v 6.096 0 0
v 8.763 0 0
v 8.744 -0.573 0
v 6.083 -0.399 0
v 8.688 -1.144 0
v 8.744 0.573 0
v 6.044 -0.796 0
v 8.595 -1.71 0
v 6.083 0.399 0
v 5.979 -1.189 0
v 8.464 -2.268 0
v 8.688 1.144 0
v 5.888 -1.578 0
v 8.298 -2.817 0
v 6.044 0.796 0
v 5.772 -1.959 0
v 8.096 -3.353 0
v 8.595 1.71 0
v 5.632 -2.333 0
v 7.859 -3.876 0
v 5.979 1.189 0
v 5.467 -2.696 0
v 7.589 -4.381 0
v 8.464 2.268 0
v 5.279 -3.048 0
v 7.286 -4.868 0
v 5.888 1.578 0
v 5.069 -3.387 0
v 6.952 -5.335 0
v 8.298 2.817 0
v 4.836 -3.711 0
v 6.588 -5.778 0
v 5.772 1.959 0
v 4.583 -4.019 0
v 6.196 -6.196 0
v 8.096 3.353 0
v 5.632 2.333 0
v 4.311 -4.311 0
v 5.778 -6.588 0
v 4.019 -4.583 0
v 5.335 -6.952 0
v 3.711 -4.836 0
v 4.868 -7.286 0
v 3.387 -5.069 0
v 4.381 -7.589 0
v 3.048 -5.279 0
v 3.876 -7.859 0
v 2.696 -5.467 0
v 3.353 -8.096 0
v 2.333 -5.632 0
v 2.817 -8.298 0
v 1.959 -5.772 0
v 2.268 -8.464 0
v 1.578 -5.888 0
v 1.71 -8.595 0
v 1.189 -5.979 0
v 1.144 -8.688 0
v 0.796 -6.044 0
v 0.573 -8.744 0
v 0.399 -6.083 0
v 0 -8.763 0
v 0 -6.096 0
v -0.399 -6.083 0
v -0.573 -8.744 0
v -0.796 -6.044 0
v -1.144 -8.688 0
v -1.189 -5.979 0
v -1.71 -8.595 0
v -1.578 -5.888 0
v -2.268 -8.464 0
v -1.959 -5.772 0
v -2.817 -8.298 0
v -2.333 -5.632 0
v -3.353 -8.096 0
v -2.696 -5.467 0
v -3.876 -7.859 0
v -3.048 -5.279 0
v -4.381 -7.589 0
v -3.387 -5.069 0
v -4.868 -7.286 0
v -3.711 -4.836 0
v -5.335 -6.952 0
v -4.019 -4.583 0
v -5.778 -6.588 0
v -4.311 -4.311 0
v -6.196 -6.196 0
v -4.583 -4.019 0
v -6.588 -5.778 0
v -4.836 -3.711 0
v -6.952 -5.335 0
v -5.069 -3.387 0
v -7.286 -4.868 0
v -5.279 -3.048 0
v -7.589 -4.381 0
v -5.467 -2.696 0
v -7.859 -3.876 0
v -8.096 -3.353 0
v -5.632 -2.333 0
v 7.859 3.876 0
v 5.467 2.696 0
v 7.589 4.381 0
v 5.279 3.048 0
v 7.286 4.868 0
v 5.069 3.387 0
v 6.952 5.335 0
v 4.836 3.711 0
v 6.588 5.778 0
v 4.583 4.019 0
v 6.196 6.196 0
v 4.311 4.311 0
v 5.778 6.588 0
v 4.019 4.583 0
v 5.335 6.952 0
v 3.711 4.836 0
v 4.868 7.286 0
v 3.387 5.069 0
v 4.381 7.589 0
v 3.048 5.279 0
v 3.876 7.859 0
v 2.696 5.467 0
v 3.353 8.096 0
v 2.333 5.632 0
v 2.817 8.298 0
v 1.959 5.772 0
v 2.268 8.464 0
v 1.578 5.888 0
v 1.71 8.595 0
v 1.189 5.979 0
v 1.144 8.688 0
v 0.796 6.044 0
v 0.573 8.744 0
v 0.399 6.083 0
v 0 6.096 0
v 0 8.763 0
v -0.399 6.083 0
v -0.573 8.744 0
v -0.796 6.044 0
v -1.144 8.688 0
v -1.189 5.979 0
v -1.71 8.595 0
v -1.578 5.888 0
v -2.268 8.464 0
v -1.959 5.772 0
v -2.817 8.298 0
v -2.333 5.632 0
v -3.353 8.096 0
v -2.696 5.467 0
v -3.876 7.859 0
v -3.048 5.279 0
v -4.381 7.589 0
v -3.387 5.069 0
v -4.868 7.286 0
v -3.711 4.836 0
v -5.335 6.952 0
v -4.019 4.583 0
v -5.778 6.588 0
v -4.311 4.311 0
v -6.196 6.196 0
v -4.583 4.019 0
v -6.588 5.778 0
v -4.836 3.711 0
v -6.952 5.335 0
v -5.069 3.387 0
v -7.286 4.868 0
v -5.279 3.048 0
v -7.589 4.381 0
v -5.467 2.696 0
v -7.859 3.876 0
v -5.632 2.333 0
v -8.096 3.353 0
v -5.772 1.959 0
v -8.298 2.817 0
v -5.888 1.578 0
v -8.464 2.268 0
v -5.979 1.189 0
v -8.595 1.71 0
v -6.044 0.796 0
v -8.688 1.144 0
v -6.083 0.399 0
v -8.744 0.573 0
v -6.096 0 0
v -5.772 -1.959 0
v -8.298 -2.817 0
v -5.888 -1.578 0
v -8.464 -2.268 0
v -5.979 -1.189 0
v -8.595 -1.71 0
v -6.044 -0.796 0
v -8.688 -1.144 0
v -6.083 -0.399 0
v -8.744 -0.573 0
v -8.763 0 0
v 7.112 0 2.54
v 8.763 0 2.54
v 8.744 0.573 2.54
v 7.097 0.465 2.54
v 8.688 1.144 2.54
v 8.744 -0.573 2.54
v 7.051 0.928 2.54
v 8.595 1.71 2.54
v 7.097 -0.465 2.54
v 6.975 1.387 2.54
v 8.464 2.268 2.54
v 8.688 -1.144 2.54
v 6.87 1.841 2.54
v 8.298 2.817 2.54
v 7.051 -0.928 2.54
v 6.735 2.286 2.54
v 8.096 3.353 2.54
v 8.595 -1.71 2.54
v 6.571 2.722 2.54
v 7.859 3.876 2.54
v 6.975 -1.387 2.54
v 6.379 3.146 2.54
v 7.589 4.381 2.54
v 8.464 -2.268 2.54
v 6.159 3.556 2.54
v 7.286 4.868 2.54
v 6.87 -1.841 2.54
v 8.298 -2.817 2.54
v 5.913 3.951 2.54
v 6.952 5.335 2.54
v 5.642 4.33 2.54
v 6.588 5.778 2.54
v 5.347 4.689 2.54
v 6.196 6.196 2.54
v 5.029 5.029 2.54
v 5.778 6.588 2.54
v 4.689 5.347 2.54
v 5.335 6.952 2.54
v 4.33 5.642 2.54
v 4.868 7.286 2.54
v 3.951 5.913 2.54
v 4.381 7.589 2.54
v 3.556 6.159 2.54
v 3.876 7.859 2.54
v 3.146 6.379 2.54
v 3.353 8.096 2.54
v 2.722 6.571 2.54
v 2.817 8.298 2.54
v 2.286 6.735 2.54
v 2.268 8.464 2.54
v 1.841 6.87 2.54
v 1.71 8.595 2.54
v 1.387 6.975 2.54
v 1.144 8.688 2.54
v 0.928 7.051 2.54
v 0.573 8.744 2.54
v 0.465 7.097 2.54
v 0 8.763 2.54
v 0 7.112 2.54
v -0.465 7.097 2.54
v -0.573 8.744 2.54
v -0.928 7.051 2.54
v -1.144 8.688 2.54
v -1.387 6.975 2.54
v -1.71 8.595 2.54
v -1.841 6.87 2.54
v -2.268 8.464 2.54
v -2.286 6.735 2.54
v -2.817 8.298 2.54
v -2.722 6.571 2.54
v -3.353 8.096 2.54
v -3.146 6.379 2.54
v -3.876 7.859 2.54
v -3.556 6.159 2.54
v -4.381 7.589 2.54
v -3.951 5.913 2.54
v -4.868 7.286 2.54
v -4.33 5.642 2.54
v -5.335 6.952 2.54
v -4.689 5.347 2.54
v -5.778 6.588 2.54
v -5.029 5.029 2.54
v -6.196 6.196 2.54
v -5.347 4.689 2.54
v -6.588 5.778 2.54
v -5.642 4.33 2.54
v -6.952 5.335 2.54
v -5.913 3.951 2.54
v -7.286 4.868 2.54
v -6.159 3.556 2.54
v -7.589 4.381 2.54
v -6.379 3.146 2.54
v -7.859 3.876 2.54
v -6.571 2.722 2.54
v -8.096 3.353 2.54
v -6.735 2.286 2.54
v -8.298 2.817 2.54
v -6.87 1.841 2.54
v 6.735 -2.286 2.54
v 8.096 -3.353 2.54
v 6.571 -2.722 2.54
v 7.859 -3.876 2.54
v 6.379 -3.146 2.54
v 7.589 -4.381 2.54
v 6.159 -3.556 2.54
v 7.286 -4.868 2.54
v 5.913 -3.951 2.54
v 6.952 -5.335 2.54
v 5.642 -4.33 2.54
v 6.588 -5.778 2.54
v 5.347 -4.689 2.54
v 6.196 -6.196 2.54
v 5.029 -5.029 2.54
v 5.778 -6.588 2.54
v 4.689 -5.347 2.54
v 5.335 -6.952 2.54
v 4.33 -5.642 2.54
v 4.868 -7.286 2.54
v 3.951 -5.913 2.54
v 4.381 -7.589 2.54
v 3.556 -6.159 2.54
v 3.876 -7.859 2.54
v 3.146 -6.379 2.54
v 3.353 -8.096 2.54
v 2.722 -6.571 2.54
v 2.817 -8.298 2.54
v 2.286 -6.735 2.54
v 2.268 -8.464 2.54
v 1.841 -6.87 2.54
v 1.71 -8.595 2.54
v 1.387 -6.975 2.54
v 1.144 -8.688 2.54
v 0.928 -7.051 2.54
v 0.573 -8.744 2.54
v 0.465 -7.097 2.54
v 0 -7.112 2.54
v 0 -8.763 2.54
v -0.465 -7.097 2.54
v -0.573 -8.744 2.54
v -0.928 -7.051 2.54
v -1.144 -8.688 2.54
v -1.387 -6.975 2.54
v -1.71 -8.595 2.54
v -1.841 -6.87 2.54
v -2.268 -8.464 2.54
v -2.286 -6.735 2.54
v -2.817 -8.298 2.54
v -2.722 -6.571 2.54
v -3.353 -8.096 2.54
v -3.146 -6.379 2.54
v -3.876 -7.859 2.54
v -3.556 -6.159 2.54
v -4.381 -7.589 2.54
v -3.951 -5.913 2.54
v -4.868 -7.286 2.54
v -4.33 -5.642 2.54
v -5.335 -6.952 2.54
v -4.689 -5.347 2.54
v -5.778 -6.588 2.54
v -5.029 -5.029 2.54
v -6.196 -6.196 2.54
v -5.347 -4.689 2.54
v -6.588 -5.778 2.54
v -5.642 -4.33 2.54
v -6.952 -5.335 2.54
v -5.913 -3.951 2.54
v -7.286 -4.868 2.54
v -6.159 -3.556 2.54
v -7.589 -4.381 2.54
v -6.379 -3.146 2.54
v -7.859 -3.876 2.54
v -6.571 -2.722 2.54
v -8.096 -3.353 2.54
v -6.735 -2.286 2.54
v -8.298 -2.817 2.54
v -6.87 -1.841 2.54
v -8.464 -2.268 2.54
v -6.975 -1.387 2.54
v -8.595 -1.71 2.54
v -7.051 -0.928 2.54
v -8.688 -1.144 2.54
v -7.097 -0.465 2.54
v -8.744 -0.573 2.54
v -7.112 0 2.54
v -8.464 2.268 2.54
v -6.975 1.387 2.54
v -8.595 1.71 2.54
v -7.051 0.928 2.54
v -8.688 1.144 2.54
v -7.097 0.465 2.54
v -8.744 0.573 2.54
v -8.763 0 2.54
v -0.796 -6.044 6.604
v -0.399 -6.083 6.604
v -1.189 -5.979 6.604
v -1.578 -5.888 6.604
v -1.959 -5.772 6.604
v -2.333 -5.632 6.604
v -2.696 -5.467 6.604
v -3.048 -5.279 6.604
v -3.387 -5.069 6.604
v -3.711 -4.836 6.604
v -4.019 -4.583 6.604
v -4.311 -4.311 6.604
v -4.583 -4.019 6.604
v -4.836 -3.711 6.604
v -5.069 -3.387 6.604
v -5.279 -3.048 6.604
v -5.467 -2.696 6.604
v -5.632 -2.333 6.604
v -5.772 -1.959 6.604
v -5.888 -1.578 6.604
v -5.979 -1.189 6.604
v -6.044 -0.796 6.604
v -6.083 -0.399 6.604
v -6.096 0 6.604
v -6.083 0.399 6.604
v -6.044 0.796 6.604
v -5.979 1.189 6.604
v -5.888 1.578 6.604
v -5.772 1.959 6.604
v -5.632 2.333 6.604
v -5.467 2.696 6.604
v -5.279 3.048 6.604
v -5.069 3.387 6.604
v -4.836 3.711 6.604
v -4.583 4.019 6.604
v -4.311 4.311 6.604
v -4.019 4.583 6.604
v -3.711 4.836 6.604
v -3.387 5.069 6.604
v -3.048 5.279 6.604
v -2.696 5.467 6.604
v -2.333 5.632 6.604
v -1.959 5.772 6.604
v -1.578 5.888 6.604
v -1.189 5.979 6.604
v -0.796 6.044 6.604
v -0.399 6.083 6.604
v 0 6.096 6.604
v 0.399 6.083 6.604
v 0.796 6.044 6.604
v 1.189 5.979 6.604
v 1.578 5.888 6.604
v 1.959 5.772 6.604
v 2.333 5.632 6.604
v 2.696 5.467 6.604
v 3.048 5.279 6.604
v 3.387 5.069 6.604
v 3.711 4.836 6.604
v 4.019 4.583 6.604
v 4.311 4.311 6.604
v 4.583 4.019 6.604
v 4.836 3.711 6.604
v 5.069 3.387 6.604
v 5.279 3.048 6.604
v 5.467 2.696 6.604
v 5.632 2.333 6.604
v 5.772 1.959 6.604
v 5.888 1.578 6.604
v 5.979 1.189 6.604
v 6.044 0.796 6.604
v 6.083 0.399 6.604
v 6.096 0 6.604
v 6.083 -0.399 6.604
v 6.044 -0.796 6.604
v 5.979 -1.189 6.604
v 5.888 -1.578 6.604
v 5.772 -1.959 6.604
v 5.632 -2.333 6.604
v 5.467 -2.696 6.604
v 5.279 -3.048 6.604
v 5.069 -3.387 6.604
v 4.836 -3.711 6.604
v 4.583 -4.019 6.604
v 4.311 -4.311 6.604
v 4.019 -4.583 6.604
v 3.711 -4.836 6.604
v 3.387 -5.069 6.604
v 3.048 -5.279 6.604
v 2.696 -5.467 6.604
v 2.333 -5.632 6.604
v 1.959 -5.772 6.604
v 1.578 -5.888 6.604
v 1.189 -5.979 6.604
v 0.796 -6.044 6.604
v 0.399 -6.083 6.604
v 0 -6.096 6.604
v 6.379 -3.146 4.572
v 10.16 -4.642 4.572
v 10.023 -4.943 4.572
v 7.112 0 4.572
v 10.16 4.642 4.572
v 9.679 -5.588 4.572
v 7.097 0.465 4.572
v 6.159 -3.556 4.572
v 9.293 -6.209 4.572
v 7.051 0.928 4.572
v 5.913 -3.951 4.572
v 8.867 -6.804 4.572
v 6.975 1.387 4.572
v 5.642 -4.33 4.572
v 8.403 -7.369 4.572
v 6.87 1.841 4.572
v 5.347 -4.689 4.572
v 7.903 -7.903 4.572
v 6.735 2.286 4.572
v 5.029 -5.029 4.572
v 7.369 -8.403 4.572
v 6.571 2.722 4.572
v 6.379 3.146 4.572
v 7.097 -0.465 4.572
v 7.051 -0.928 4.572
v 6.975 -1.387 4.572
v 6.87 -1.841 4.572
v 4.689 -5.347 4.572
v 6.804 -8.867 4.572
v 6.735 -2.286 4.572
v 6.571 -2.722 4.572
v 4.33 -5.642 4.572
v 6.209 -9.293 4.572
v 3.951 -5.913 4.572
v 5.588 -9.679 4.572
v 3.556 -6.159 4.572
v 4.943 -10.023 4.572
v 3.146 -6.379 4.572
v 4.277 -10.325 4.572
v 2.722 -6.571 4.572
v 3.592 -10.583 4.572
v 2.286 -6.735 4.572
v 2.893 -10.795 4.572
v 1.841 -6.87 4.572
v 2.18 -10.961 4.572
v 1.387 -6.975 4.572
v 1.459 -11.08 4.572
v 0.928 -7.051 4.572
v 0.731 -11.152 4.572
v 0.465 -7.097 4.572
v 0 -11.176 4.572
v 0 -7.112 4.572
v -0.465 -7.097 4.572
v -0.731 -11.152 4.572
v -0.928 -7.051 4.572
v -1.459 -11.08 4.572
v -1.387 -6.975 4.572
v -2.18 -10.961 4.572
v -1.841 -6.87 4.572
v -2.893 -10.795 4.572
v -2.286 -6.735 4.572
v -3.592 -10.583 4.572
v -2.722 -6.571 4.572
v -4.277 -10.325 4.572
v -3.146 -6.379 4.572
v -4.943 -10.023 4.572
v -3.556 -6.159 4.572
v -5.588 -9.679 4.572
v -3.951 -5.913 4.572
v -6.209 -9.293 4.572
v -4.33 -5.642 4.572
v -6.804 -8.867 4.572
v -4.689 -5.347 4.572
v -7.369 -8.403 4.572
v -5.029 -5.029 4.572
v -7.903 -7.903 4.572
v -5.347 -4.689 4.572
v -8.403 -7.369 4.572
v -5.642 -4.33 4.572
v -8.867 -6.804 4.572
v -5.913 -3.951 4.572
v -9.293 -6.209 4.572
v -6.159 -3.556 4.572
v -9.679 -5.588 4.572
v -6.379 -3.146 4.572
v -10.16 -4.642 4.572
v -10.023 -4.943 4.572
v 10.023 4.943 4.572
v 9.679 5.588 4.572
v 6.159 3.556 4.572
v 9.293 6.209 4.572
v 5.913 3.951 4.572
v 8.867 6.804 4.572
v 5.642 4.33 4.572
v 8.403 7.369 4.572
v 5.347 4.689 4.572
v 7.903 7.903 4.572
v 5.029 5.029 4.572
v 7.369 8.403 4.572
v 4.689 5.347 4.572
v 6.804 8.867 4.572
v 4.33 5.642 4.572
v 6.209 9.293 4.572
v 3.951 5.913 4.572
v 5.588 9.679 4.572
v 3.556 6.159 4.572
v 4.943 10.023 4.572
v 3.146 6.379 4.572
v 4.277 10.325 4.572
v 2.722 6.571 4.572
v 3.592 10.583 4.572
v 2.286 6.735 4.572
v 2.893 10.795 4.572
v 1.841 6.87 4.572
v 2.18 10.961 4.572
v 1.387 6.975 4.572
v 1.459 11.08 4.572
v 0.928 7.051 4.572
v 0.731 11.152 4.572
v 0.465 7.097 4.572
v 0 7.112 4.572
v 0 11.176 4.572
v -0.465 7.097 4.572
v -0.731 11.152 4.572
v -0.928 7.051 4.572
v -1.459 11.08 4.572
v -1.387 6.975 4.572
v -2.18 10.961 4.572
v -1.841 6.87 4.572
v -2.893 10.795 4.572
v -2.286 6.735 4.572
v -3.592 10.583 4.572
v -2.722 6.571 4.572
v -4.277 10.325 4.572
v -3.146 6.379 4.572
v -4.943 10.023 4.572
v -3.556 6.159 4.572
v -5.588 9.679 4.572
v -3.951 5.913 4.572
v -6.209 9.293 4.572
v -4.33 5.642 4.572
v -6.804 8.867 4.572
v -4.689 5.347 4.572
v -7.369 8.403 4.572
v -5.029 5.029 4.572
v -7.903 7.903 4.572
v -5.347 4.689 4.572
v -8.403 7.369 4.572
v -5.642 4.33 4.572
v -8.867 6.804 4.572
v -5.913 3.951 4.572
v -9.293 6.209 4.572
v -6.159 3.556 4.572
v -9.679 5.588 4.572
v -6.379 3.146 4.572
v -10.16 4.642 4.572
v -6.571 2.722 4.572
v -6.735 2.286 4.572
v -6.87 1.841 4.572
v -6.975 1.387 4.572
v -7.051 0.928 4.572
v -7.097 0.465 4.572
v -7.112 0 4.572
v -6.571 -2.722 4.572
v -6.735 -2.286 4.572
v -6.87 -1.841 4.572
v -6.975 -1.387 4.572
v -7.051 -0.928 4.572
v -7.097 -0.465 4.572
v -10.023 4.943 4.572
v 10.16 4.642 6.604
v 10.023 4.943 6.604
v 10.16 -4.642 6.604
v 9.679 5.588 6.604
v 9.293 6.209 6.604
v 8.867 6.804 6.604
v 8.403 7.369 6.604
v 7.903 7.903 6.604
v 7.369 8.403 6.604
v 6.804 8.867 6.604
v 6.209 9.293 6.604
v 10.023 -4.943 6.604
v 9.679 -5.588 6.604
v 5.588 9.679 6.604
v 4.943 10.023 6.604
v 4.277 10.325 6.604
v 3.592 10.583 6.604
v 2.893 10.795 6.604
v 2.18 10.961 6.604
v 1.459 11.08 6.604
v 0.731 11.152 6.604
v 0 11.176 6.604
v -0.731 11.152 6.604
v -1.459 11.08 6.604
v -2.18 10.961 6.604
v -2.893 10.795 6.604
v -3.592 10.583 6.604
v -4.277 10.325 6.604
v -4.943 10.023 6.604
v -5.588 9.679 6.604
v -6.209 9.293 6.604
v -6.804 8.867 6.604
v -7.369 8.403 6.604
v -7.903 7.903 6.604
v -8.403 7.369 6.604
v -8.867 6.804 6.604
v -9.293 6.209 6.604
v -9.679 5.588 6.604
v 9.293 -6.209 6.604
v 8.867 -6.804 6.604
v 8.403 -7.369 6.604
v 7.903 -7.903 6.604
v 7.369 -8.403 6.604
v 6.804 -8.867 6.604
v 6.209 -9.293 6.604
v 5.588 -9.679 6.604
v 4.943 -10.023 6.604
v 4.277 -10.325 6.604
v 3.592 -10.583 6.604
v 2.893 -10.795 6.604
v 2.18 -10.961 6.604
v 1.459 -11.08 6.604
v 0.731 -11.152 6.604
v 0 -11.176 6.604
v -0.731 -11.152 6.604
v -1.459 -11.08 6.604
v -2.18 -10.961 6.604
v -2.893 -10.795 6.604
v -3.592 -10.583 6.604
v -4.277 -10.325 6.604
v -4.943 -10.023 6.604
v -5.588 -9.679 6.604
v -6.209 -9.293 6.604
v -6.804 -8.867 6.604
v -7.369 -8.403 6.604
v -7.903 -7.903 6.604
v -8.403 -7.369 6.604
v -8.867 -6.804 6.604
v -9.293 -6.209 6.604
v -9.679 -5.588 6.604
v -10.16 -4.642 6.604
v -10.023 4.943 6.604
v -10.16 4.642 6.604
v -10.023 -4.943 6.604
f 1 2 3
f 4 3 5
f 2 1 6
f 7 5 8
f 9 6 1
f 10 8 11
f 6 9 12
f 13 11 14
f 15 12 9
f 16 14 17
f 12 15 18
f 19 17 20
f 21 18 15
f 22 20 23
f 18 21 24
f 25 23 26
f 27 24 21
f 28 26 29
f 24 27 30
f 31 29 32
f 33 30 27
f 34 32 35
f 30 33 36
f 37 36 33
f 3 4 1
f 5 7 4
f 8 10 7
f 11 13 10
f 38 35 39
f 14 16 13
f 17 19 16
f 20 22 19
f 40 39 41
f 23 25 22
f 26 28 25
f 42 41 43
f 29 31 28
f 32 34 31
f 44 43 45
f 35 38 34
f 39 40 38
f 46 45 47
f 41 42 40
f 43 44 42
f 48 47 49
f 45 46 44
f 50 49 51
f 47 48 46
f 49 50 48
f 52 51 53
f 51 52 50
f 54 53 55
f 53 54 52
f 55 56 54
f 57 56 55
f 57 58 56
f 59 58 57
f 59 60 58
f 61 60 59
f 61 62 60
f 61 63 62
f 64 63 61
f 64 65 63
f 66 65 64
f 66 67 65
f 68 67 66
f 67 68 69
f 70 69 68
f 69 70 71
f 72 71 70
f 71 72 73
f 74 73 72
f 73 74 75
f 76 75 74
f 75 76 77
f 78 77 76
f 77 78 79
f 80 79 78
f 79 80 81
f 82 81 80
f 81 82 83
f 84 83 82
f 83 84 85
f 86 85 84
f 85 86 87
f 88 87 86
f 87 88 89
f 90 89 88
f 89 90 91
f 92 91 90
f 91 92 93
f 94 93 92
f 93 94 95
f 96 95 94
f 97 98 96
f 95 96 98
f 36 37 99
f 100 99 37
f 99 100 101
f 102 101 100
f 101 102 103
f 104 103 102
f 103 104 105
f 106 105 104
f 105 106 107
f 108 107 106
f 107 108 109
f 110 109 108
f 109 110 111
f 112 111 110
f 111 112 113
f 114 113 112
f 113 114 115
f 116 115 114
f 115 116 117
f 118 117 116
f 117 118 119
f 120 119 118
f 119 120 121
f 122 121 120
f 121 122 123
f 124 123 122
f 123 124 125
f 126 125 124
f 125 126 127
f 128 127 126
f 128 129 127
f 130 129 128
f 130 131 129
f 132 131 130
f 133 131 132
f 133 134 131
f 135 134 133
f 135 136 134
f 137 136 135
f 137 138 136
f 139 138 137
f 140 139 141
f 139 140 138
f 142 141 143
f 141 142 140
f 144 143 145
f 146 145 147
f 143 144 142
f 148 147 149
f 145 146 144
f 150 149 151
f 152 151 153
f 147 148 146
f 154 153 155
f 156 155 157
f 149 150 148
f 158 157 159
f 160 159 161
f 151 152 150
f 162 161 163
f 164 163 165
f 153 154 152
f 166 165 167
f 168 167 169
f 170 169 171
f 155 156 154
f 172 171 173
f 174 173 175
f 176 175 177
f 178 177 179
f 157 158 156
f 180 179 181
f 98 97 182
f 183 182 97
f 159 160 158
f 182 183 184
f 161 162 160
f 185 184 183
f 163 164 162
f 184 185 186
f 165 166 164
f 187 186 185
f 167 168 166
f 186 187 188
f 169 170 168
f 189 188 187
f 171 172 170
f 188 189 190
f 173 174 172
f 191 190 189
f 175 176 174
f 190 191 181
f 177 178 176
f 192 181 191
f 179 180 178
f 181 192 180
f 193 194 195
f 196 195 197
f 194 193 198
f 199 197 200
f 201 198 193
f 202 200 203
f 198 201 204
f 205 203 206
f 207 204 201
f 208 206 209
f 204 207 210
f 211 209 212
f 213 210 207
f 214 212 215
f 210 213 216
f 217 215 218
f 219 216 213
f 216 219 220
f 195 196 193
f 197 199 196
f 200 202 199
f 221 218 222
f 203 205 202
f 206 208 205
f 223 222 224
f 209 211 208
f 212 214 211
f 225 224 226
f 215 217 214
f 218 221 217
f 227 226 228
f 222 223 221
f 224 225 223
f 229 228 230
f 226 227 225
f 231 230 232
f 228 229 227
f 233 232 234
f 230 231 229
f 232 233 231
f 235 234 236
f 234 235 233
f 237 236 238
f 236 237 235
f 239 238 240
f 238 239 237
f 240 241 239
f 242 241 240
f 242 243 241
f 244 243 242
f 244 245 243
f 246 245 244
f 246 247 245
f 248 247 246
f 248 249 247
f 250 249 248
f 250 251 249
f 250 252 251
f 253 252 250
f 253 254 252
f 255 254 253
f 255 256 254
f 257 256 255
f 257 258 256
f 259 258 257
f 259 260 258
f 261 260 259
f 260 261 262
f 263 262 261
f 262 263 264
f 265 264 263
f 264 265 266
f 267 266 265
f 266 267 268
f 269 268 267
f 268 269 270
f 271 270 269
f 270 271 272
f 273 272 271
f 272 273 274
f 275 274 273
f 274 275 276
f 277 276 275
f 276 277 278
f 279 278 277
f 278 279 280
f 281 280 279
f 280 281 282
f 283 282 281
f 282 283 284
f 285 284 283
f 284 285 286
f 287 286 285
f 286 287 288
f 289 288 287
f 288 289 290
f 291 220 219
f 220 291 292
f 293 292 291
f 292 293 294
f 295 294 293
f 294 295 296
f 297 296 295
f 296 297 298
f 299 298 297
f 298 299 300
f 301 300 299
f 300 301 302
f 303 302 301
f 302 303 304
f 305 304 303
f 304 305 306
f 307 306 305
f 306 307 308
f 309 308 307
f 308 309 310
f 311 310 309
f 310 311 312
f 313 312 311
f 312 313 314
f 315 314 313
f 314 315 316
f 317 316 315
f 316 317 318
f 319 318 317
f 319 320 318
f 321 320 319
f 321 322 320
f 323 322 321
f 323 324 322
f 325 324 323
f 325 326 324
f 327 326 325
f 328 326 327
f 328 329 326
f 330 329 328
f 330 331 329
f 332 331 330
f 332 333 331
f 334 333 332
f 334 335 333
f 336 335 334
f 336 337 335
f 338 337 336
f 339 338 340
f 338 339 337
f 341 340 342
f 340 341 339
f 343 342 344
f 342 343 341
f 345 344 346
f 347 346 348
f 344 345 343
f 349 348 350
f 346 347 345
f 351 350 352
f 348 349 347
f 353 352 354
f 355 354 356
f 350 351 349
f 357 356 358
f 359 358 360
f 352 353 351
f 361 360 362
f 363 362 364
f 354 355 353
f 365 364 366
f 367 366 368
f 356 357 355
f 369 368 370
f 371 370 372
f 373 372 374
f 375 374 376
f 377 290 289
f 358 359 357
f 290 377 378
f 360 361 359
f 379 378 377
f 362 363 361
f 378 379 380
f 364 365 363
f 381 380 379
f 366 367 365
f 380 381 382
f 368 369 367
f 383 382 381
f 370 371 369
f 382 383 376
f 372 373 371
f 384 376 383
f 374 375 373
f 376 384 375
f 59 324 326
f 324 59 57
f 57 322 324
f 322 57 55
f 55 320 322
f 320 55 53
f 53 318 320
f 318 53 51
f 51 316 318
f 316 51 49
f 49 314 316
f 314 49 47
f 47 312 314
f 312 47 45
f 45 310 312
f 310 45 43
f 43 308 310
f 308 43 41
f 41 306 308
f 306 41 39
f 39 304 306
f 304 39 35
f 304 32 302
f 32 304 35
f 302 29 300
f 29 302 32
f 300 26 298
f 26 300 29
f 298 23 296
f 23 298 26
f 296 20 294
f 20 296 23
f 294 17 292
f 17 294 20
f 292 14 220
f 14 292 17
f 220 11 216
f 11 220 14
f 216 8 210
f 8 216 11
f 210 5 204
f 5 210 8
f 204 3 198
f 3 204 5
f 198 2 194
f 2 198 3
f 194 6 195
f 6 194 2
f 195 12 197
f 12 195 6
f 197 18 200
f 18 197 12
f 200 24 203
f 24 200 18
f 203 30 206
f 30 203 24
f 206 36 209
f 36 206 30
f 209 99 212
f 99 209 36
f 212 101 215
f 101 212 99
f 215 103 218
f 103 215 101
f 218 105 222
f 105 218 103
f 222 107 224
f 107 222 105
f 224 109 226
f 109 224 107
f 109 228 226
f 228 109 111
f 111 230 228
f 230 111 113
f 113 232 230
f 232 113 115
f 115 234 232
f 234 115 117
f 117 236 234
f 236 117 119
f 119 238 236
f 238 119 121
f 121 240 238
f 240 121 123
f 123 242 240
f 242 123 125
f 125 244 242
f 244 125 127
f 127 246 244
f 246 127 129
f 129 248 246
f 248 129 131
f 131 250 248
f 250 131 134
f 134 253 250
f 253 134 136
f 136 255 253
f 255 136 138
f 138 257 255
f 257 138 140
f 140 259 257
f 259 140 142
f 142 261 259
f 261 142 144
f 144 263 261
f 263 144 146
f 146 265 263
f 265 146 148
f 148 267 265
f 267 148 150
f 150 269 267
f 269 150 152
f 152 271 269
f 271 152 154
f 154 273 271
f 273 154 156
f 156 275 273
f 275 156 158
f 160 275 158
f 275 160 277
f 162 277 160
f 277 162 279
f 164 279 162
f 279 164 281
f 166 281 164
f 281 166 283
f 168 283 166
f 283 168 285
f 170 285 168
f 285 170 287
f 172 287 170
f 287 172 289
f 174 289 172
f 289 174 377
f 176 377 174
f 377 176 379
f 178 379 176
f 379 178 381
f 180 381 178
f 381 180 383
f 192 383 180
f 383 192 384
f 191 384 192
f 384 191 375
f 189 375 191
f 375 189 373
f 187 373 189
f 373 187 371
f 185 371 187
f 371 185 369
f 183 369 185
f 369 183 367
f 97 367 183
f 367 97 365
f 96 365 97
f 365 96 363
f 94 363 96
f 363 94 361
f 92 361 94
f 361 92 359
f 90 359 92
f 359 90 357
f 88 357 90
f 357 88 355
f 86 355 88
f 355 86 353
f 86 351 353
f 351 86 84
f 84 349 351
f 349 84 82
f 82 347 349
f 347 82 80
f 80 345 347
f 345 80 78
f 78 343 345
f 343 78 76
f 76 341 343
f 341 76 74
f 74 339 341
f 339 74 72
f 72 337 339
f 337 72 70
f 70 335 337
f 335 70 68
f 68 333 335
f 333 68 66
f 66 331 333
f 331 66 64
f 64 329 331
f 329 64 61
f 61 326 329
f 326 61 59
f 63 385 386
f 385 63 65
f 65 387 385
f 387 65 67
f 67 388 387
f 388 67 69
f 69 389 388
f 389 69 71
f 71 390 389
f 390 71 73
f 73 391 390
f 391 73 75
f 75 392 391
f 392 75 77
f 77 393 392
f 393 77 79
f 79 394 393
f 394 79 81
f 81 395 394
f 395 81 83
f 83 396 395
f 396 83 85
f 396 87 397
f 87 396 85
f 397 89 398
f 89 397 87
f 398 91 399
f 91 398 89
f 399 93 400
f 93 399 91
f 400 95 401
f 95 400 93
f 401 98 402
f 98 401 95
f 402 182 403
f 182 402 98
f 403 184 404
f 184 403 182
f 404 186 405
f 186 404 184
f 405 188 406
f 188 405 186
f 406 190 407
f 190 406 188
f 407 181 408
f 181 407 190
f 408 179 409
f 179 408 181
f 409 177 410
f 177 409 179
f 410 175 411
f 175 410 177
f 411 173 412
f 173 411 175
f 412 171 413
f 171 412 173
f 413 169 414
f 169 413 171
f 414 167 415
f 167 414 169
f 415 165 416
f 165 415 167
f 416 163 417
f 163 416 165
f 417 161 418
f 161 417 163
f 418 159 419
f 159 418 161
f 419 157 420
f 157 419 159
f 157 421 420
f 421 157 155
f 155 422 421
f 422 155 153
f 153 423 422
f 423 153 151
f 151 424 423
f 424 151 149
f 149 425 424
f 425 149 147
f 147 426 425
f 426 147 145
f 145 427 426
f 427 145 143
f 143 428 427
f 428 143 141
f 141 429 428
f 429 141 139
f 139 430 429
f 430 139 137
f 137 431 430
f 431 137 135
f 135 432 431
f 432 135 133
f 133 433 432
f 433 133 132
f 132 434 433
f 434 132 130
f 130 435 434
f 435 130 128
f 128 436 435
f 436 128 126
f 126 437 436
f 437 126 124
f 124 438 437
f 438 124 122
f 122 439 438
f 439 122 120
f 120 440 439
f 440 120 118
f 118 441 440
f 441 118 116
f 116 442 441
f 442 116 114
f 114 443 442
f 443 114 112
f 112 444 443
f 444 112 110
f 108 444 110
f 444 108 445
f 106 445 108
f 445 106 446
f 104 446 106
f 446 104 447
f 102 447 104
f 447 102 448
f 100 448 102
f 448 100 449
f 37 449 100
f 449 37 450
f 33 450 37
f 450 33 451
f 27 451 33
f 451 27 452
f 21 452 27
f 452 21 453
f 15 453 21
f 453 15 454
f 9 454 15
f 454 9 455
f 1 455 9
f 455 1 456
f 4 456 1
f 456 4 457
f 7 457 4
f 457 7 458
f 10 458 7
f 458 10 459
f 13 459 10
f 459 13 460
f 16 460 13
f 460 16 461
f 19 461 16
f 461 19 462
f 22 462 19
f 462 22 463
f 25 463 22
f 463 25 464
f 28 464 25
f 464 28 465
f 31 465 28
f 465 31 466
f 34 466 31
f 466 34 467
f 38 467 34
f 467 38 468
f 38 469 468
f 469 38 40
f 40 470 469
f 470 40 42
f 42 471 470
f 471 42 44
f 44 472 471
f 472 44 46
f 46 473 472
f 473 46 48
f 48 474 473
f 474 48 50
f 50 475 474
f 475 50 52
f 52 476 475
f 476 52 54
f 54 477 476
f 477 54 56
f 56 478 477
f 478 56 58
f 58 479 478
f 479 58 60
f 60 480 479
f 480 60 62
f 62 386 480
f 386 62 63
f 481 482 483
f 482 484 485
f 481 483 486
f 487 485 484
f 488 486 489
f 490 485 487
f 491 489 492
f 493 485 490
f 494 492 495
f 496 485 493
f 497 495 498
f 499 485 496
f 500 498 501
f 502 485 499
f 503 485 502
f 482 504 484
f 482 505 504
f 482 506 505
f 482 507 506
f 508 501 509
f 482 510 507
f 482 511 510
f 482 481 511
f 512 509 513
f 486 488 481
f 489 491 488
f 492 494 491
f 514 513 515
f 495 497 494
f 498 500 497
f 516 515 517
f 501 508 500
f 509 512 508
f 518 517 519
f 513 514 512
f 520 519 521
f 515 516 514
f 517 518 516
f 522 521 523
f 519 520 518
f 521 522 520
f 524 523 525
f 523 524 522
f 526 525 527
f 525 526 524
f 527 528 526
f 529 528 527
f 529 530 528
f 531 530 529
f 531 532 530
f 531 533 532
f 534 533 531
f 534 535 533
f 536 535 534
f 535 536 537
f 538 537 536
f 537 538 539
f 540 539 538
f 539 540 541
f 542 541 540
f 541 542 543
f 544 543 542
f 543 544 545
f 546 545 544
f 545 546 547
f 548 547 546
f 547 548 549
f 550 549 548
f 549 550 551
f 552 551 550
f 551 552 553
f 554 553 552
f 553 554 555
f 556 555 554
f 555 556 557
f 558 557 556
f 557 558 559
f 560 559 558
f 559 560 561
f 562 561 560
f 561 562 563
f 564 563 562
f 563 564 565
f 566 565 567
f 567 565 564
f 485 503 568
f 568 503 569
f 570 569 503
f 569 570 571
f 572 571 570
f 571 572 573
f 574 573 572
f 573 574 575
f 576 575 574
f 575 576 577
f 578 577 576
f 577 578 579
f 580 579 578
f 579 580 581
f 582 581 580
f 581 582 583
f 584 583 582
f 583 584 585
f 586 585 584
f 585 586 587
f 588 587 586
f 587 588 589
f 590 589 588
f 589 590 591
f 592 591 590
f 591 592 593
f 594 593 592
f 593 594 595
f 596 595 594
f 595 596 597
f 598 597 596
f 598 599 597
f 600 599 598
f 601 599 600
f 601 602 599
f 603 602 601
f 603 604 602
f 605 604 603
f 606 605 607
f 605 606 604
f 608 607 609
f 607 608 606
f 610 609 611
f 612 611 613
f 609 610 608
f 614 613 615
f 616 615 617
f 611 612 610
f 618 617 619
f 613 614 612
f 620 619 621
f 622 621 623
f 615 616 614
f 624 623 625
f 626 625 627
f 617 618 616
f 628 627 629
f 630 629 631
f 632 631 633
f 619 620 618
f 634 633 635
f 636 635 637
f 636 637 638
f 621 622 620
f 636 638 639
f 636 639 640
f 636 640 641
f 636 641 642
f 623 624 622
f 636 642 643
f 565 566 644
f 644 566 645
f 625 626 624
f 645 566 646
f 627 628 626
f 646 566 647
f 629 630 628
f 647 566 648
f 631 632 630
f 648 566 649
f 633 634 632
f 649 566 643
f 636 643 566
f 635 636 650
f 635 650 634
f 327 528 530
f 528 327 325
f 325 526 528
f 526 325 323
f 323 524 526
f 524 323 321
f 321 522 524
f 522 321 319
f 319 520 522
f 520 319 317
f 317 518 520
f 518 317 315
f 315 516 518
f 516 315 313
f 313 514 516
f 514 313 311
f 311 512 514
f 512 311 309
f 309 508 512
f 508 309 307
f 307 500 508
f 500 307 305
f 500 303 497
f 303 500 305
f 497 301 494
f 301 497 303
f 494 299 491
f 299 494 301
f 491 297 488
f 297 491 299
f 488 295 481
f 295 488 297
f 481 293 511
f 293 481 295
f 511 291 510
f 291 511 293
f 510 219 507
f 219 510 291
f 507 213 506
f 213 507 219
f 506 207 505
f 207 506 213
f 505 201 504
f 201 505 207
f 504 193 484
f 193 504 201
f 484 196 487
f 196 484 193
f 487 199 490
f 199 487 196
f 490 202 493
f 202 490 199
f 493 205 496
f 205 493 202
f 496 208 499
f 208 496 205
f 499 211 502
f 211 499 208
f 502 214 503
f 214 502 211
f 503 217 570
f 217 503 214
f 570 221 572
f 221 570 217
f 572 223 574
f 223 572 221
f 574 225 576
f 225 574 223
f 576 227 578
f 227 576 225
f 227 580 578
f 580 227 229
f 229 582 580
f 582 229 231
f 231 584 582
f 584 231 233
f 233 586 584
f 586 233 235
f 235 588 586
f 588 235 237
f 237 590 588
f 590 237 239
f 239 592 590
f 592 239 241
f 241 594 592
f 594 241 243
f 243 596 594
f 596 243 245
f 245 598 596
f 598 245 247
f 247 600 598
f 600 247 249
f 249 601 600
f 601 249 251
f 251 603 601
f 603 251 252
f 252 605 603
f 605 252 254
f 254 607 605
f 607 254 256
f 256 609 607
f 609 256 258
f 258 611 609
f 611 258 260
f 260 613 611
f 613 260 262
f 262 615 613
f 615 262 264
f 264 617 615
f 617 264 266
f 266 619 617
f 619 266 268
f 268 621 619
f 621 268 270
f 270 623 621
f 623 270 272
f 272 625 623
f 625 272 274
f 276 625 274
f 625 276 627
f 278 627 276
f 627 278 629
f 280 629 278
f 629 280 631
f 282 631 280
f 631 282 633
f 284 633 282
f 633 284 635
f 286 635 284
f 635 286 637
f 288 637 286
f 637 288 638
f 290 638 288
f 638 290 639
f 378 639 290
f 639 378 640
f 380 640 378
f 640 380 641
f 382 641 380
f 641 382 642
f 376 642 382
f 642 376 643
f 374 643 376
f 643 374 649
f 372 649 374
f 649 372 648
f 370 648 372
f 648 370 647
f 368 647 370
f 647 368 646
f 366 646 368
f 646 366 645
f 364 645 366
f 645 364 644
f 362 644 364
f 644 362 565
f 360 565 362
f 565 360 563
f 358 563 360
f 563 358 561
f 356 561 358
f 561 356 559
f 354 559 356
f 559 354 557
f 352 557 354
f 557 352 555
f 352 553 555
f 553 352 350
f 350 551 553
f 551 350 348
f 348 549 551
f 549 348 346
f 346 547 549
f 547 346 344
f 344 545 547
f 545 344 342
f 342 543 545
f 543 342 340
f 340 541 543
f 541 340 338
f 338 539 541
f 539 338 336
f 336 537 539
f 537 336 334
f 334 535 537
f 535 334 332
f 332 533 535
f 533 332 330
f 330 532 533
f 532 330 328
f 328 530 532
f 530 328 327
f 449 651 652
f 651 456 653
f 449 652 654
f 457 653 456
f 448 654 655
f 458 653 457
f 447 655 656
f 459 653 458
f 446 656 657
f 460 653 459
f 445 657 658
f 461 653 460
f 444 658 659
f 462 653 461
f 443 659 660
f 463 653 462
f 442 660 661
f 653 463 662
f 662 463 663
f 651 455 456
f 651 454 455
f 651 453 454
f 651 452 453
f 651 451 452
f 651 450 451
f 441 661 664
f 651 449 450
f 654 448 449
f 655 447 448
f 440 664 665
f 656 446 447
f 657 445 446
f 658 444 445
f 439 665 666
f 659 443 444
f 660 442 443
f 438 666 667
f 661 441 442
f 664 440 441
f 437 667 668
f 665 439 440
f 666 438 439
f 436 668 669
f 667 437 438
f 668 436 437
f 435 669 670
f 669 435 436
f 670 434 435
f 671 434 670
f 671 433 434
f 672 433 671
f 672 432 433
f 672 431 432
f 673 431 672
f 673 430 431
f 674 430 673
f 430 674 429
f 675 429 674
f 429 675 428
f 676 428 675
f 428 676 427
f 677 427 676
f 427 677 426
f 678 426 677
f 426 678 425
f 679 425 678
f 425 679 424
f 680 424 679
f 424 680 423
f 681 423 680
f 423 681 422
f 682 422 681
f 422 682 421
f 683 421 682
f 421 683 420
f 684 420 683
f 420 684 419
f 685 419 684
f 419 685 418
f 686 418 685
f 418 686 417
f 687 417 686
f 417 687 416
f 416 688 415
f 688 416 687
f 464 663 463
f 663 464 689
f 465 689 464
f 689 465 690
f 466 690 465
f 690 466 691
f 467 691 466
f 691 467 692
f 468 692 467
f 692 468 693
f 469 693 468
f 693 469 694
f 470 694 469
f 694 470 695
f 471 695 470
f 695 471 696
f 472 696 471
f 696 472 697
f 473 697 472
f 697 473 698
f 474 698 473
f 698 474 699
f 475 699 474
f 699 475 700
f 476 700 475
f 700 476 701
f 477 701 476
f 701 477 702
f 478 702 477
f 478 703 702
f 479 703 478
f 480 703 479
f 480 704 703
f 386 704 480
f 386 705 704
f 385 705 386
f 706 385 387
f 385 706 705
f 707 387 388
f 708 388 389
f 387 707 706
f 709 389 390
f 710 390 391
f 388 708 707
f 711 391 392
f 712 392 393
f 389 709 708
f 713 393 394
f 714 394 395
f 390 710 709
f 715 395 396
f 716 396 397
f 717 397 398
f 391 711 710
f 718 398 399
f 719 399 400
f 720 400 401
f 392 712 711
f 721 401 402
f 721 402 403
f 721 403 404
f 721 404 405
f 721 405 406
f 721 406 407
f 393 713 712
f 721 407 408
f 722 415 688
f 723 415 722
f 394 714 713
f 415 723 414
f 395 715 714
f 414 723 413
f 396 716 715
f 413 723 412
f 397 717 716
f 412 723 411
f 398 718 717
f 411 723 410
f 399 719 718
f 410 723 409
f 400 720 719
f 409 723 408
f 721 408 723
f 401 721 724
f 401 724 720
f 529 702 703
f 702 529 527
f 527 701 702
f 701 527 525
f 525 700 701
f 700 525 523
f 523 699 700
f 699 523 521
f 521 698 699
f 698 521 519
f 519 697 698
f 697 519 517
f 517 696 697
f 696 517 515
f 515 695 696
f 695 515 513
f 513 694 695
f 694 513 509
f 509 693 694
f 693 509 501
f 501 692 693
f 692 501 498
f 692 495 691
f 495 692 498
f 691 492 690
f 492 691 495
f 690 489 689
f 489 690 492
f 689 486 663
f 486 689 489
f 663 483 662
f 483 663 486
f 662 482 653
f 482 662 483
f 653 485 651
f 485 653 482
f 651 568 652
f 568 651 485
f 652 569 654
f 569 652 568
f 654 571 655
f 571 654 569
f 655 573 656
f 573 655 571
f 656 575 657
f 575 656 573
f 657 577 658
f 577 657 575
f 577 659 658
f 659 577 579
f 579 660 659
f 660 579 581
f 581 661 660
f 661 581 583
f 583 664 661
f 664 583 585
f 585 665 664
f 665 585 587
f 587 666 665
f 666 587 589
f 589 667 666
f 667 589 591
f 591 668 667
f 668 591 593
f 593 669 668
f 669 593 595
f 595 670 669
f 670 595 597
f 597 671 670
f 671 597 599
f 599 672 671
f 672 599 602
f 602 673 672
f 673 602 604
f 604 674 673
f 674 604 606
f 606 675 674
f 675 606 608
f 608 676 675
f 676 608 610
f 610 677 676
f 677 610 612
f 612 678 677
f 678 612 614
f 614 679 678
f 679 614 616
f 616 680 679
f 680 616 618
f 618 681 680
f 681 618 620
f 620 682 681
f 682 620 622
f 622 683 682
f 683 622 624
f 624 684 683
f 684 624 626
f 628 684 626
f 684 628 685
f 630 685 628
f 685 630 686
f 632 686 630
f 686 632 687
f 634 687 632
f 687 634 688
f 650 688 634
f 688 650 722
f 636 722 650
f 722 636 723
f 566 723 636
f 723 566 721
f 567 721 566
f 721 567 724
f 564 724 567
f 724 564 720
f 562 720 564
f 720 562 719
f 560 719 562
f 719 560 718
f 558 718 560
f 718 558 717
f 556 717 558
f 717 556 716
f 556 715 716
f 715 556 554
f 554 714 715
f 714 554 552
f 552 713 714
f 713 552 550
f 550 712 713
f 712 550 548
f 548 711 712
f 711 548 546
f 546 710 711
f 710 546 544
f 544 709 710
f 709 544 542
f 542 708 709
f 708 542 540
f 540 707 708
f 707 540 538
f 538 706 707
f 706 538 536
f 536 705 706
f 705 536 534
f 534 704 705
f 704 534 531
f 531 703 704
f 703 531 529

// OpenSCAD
ViewScale = [0.0254, 0.0254, 0.0254];

scale(ViewScale)
{
    linear_extrude(100)
    difference() {
        circle(345, $fn=96);
        circle(240, $fn=96);
    }

    translate([0, 0, 100])
    linear_extrude(80)
    difference() {
        circle(280, $fn=96);
        circle(240, $fn=96);
    }

    translate([0, 0, 180])
    linear_extrude(80)
    intersection() {
        square([800, 1000], true);
        difference() {
            circle(440, $fn=96);
            circle(240, $fn=96);
        }
    }




//    translate([0,-0,100]) linear_extrude(100) circle(345, $fn=96);
//
//
//    translate([0, 1000, 0])
//    linear_extrude(130)
//    difference()
//    {
//        circle(266, $fn=96);
//        circle(125, $fn=96);
//    }

}
